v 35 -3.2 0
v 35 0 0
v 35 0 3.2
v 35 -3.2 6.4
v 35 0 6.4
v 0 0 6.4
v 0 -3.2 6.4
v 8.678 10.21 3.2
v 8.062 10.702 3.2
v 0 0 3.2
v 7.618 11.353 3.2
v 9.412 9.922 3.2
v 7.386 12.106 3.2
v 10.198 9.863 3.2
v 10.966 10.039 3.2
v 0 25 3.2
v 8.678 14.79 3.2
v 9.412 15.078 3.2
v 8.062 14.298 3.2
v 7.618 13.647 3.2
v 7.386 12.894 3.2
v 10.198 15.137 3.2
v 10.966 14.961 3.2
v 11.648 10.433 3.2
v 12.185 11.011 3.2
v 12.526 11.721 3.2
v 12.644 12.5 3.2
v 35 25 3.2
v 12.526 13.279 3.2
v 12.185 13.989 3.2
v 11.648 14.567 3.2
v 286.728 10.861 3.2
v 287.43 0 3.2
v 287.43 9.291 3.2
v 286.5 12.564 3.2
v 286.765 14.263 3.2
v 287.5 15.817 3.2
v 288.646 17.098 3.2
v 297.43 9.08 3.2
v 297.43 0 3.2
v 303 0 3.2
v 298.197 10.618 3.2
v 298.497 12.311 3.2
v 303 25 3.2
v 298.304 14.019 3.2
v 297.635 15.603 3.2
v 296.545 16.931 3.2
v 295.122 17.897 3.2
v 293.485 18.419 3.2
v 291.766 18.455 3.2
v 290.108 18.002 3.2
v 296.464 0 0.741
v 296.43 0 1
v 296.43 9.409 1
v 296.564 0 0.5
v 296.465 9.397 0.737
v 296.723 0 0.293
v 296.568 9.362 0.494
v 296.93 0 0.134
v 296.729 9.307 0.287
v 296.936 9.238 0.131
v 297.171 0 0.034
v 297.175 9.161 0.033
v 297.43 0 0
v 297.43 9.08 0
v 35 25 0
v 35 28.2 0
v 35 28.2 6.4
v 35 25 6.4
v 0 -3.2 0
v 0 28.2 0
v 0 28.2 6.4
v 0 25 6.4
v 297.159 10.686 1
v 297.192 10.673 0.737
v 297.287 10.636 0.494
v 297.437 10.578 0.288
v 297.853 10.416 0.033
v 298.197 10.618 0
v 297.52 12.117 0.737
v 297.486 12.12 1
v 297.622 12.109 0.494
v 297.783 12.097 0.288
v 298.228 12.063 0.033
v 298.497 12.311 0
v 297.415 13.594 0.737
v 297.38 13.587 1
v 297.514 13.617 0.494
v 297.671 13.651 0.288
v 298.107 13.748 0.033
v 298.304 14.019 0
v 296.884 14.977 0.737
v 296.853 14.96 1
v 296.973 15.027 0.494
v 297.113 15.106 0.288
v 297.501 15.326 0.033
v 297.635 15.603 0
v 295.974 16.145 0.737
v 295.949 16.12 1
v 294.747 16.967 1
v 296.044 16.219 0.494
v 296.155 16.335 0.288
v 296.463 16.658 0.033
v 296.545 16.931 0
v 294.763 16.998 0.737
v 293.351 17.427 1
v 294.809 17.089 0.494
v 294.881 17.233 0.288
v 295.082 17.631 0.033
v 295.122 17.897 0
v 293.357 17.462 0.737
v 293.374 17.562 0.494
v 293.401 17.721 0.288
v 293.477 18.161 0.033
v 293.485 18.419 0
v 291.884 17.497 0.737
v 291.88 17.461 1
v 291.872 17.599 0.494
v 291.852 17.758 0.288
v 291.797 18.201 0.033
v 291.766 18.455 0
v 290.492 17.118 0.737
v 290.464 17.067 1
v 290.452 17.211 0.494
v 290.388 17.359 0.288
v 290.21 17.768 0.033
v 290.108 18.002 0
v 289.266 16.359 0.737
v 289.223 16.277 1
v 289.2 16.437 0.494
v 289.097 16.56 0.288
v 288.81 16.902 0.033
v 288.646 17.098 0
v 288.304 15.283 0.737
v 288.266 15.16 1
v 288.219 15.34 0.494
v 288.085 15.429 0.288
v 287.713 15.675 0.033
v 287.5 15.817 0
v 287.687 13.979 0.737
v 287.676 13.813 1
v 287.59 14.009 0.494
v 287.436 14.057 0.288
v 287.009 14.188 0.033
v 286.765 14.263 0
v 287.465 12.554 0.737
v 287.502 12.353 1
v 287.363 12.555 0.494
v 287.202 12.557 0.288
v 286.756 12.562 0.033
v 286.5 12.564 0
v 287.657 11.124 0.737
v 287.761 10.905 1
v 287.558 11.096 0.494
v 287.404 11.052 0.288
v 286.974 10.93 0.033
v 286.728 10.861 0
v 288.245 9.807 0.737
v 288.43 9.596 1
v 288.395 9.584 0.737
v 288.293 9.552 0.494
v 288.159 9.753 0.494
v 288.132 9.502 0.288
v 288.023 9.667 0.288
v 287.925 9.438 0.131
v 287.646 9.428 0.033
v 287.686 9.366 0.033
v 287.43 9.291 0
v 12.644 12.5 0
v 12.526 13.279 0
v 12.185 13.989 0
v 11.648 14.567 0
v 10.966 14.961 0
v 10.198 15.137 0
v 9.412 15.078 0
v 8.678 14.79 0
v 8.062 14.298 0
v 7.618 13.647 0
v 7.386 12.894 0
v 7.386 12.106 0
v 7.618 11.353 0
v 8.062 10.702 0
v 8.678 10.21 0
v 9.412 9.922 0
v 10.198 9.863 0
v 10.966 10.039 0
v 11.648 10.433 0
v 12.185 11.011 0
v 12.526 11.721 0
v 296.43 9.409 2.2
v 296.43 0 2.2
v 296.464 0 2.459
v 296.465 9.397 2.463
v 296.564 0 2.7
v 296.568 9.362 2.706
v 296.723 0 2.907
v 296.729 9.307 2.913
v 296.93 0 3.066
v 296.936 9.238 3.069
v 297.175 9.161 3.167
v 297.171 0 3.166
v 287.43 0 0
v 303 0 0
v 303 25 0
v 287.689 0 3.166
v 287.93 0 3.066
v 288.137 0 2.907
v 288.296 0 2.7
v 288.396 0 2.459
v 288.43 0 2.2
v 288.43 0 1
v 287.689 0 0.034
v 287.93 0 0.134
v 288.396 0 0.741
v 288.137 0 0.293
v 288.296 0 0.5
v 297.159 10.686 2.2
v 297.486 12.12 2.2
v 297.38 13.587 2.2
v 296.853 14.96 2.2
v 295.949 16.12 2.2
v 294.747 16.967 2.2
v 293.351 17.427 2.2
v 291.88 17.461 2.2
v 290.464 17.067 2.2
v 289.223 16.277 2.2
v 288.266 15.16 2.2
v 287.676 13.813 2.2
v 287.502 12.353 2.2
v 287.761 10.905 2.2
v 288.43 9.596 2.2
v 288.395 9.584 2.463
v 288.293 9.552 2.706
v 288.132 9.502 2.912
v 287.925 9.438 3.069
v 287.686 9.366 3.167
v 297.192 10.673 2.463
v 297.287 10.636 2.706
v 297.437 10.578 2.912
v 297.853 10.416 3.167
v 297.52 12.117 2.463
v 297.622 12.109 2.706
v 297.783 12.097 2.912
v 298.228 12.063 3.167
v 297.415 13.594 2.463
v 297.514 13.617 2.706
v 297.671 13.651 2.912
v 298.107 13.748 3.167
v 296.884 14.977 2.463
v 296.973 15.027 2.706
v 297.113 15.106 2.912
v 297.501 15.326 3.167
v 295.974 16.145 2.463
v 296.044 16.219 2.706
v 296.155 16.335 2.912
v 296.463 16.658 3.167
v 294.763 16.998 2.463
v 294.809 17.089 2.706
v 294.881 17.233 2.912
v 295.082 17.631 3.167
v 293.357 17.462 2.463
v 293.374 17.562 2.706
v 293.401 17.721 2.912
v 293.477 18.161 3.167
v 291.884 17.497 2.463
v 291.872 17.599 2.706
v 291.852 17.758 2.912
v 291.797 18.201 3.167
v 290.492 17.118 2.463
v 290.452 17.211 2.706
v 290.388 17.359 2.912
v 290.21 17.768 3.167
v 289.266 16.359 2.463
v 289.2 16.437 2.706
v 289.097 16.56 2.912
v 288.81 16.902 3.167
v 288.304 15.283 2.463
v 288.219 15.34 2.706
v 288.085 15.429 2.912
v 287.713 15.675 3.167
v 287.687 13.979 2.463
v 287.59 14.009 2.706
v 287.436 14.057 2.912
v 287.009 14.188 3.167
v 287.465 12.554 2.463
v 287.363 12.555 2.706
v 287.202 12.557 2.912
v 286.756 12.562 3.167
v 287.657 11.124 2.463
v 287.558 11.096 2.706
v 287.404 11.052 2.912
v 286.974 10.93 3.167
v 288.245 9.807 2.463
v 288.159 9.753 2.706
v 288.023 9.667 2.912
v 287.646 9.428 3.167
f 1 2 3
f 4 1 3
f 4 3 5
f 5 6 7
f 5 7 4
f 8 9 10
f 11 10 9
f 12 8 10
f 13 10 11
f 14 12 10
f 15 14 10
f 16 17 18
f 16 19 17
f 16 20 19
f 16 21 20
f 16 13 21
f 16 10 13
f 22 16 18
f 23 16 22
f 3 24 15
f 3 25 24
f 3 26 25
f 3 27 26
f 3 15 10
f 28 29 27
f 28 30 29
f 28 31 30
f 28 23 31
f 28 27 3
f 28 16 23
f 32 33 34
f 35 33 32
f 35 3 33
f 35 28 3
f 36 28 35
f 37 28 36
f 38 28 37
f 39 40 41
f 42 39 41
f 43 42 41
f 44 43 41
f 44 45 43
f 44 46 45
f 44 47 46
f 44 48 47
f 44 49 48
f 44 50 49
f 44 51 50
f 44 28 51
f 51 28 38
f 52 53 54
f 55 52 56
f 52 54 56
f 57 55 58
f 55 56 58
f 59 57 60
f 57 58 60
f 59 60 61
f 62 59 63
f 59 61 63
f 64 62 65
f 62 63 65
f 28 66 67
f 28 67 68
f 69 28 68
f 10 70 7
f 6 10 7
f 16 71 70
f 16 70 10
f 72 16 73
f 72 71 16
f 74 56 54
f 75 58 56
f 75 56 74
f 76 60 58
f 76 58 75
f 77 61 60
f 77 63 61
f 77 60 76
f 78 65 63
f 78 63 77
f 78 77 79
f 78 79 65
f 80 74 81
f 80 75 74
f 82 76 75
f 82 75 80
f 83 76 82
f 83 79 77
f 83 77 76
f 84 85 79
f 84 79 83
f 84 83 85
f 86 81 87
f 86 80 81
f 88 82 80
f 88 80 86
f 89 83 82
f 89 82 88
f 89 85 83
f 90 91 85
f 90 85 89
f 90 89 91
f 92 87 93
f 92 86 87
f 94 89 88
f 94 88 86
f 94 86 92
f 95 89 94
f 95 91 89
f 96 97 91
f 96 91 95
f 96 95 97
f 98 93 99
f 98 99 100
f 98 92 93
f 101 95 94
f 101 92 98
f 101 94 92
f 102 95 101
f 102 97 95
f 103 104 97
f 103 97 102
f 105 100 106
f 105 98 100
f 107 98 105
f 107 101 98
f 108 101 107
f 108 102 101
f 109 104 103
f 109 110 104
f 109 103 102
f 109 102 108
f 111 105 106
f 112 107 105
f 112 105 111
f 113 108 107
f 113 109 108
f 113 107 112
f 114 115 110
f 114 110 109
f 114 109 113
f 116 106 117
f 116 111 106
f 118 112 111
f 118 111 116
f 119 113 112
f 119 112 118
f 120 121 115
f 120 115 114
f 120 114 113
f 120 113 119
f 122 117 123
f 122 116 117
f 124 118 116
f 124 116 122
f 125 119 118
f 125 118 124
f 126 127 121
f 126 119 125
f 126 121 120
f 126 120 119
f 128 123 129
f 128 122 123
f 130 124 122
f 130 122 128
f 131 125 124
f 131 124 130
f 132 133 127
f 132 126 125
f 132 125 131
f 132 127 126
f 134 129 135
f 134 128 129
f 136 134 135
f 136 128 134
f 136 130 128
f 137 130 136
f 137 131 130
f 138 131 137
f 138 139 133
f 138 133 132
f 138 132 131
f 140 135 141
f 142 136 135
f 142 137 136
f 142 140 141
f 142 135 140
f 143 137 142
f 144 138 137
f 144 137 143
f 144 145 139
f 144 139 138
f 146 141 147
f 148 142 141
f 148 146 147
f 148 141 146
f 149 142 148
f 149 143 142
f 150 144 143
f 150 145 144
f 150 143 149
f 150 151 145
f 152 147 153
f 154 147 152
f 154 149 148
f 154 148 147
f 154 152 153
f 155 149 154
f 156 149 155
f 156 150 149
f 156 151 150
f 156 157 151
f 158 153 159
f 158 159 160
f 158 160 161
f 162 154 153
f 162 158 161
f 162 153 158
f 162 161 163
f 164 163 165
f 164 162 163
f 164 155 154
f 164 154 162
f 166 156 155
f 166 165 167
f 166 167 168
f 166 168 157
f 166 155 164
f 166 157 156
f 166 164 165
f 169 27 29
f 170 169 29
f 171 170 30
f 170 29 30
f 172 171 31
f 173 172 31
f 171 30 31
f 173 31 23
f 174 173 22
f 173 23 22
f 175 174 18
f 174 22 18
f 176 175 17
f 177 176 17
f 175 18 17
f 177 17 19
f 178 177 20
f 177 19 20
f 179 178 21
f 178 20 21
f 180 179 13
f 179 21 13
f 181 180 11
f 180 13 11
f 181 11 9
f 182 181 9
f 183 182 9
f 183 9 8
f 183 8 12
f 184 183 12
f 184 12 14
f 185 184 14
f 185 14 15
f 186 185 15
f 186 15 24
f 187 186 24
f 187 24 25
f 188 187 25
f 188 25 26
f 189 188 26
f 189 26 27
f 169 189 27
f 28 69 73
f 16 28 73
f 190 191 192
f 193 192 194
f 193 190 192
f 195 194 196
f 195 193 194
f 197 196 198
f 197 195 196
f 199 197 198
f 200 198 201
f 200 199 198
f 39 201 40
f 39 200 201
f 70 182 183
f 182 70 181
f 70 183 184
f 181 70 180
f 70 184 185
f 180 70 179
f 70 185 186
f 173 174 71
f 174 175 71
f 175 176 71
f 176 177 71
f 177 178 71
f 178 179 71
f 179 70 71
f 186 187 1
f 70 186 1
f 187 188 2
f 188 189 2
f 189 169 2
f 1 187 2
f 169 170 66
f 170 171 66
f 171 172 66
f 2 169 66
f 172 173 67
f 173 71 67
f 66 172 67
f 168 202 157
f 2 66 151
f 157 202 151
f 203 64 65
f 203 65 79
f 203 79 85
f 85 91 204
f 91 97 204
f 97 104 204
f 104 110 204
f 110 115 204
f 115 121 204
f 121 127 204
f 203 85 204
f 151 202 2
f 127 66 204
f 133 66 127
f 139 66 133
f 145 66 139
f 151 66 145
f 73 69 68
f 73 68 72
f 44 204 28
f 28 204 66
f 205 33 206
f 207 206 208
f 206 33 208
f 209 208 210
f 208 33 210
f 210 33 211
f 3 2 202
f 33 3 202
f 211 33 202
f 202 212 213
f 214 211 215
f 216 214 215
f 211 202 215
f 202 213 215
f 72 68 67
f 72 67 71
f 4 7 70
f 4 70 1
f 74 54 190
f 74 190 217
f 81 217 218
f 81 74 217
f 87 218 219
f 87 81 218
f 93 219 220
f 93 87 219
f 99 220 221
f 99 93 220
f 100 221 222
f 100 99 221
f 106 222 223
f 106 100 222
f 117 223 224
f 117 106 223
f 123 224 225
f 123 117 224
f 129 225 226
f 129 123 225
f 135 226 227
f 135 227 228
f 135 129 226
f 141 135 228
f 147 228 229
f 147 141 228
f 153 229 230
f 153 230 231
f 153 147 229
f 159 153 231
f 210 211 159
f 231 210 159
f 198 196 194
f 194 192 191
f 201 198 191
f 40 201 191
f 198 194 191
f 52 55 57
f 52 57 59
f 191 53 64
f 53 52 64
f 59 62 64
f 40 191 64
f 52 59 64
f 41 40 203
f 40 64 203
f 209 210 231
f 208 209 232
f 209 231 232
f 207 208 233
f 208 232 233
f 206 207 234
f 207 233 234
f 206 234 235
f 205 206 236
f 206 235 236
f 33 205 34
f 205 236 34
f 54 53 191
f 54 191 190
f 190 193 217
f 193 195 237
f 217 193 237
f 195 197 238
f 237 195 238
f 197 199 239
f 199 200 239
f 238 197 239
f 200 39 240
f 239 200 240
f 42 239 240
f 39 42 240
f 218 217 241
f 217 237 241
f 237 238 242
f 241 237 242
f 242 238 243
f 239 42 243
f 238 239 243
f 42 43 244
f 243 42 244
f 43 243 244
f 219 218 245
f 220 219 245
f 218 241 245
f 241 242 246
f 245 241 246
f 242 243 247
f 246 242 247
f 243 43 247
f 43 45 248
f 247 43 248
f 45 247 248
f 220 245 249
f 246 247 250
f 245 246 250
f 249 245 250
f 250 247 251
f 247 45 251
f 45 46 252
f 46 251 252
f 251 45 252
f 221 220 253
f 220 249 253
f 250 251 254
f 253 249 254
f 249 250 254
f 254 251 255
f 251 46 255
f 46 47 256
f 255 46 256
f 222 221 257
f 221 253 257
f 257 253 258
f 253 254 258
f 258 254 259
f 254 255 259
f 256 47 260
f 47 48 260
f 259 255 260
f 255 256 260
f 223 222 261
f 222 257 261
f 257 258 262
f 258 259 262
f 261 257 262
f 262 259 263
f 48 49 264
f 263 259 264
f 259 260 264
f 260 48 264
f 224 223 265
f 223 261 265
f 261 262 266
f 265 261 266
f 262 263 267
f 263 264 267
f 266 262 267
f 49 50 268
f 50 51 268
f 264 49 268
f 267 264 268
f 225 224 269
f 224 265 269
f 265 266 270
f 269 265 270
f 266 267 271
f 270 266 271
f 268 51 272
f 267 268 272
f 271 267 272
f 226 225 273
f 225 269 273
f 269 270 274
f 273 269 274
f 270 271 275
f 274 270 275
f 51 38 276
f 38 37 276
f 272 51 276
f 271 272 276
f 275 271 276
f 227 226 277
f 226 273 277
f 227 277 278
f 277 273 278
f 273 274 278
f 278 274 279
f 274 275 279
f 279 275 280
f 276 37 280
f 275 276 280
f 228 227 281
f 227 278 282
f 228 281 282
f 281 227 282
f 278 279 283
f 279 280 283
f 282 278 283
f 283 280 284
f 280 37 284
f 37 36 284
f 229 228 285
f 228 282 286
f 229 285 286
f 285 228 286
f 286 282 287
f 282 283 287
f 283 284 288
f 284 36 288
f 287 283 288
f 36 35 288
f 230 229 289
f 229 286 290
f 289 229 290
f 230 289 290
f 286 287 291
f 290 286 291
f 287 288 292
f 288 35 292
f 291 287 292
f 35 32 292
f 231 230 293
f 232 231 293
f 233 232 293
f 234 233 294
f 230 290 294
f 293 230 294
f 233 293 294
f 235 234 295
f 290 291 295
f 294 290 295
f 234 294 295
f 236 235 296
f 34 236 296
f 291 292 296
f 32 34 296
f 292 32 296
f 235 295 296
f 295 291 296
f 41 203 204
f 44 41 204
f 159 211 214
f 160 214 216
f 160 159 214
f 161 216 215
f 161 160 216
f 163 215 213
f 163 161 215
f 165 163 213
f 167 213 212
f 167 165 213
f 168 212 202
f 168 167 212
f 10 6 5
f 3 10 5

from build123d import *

# Parameters (mm, degrees)
PAD_DEPTH    = 3.2
FILLET_R     = 1
SKETCH001_R  = 2.64391
POCKET_DEPTH = 5
SKETCH002_W  = 35
SKETCH002_H  = 6.4
PAD001_DEPTH = 3.2
SKETCH003_W  = 35
SKETCH003_H  = 6.4
PAD002_DEPTH = 3.2


with BuildPart() as part:
    # Sketch → Pad (new body)
    with BuildSketch(Plane.XY):
        with BuildLine():
            Line((0, 0), (288.43, 0))
            Line((288.43, 0), (288.43, 9.595676))
            ThreePointArc((296.43, 9.408868), (292.616723, 17.498637), (288.43, 9.595676))
            Line((296.43, 0), (296.43, 9.408868))
            Line((296.43, 0), (303, 0))
            Line((303, 0), (303, 25))
            Line((303, 25), (0, 25))
            Line((0, 25), (0, 0))
        make_face()
    extrude(amount=PAD_DEPTH)

    # Fillet
    fillet_edges = [part.edges().sort_by_distance(p)[0] for p in [
        (296.43, 4.704434, 0),
        (292.616723, 17.498637, 0),
        (288.43, 4.797838, 0),
        (296.43, 4.704434, 3.2),
        (288.43, 4.797838, 3.2),
        (292.616723, 17.498637, 3.2),
    ]]
    fillet(fillet_edges, radius=FILLET_R)

    # Sketch001 (on Face6 of Fillet) → Pocket (cut)
    with BuildSketch(Plane.XY.offset(3.2)):
        with Locations((10, 12.5)):
            Circle(SKETCH001_R)
    extrude(amount=-POCKET_DEPTH, mode=Mode.SUBTRACT)

    # Sketch002 (on Face11 of Pocket) → Pad001 (join)
    with BuildSketch(Plane(origin=(0, 25, 0), x_dir=(-1, 0, 0), z_dir=(0, 1, 0))):
        with Locations((-17.5, 3.2)):
            Rectangle(SKETCH002_W, SKETCH002_H)
    extrude(amount=PAD001_DEPTH)

    # Sketch003 (on Face15 of Pad001) → Pad002 (join)
    with BuildSketch(Plane.XZ):
        with Locations((17.5, 3.2)):
            Rectangle(SKETCH003_W, SKETCH003_H)
    extrude(amount=PAD002_DEPTH)


solid = part.part
